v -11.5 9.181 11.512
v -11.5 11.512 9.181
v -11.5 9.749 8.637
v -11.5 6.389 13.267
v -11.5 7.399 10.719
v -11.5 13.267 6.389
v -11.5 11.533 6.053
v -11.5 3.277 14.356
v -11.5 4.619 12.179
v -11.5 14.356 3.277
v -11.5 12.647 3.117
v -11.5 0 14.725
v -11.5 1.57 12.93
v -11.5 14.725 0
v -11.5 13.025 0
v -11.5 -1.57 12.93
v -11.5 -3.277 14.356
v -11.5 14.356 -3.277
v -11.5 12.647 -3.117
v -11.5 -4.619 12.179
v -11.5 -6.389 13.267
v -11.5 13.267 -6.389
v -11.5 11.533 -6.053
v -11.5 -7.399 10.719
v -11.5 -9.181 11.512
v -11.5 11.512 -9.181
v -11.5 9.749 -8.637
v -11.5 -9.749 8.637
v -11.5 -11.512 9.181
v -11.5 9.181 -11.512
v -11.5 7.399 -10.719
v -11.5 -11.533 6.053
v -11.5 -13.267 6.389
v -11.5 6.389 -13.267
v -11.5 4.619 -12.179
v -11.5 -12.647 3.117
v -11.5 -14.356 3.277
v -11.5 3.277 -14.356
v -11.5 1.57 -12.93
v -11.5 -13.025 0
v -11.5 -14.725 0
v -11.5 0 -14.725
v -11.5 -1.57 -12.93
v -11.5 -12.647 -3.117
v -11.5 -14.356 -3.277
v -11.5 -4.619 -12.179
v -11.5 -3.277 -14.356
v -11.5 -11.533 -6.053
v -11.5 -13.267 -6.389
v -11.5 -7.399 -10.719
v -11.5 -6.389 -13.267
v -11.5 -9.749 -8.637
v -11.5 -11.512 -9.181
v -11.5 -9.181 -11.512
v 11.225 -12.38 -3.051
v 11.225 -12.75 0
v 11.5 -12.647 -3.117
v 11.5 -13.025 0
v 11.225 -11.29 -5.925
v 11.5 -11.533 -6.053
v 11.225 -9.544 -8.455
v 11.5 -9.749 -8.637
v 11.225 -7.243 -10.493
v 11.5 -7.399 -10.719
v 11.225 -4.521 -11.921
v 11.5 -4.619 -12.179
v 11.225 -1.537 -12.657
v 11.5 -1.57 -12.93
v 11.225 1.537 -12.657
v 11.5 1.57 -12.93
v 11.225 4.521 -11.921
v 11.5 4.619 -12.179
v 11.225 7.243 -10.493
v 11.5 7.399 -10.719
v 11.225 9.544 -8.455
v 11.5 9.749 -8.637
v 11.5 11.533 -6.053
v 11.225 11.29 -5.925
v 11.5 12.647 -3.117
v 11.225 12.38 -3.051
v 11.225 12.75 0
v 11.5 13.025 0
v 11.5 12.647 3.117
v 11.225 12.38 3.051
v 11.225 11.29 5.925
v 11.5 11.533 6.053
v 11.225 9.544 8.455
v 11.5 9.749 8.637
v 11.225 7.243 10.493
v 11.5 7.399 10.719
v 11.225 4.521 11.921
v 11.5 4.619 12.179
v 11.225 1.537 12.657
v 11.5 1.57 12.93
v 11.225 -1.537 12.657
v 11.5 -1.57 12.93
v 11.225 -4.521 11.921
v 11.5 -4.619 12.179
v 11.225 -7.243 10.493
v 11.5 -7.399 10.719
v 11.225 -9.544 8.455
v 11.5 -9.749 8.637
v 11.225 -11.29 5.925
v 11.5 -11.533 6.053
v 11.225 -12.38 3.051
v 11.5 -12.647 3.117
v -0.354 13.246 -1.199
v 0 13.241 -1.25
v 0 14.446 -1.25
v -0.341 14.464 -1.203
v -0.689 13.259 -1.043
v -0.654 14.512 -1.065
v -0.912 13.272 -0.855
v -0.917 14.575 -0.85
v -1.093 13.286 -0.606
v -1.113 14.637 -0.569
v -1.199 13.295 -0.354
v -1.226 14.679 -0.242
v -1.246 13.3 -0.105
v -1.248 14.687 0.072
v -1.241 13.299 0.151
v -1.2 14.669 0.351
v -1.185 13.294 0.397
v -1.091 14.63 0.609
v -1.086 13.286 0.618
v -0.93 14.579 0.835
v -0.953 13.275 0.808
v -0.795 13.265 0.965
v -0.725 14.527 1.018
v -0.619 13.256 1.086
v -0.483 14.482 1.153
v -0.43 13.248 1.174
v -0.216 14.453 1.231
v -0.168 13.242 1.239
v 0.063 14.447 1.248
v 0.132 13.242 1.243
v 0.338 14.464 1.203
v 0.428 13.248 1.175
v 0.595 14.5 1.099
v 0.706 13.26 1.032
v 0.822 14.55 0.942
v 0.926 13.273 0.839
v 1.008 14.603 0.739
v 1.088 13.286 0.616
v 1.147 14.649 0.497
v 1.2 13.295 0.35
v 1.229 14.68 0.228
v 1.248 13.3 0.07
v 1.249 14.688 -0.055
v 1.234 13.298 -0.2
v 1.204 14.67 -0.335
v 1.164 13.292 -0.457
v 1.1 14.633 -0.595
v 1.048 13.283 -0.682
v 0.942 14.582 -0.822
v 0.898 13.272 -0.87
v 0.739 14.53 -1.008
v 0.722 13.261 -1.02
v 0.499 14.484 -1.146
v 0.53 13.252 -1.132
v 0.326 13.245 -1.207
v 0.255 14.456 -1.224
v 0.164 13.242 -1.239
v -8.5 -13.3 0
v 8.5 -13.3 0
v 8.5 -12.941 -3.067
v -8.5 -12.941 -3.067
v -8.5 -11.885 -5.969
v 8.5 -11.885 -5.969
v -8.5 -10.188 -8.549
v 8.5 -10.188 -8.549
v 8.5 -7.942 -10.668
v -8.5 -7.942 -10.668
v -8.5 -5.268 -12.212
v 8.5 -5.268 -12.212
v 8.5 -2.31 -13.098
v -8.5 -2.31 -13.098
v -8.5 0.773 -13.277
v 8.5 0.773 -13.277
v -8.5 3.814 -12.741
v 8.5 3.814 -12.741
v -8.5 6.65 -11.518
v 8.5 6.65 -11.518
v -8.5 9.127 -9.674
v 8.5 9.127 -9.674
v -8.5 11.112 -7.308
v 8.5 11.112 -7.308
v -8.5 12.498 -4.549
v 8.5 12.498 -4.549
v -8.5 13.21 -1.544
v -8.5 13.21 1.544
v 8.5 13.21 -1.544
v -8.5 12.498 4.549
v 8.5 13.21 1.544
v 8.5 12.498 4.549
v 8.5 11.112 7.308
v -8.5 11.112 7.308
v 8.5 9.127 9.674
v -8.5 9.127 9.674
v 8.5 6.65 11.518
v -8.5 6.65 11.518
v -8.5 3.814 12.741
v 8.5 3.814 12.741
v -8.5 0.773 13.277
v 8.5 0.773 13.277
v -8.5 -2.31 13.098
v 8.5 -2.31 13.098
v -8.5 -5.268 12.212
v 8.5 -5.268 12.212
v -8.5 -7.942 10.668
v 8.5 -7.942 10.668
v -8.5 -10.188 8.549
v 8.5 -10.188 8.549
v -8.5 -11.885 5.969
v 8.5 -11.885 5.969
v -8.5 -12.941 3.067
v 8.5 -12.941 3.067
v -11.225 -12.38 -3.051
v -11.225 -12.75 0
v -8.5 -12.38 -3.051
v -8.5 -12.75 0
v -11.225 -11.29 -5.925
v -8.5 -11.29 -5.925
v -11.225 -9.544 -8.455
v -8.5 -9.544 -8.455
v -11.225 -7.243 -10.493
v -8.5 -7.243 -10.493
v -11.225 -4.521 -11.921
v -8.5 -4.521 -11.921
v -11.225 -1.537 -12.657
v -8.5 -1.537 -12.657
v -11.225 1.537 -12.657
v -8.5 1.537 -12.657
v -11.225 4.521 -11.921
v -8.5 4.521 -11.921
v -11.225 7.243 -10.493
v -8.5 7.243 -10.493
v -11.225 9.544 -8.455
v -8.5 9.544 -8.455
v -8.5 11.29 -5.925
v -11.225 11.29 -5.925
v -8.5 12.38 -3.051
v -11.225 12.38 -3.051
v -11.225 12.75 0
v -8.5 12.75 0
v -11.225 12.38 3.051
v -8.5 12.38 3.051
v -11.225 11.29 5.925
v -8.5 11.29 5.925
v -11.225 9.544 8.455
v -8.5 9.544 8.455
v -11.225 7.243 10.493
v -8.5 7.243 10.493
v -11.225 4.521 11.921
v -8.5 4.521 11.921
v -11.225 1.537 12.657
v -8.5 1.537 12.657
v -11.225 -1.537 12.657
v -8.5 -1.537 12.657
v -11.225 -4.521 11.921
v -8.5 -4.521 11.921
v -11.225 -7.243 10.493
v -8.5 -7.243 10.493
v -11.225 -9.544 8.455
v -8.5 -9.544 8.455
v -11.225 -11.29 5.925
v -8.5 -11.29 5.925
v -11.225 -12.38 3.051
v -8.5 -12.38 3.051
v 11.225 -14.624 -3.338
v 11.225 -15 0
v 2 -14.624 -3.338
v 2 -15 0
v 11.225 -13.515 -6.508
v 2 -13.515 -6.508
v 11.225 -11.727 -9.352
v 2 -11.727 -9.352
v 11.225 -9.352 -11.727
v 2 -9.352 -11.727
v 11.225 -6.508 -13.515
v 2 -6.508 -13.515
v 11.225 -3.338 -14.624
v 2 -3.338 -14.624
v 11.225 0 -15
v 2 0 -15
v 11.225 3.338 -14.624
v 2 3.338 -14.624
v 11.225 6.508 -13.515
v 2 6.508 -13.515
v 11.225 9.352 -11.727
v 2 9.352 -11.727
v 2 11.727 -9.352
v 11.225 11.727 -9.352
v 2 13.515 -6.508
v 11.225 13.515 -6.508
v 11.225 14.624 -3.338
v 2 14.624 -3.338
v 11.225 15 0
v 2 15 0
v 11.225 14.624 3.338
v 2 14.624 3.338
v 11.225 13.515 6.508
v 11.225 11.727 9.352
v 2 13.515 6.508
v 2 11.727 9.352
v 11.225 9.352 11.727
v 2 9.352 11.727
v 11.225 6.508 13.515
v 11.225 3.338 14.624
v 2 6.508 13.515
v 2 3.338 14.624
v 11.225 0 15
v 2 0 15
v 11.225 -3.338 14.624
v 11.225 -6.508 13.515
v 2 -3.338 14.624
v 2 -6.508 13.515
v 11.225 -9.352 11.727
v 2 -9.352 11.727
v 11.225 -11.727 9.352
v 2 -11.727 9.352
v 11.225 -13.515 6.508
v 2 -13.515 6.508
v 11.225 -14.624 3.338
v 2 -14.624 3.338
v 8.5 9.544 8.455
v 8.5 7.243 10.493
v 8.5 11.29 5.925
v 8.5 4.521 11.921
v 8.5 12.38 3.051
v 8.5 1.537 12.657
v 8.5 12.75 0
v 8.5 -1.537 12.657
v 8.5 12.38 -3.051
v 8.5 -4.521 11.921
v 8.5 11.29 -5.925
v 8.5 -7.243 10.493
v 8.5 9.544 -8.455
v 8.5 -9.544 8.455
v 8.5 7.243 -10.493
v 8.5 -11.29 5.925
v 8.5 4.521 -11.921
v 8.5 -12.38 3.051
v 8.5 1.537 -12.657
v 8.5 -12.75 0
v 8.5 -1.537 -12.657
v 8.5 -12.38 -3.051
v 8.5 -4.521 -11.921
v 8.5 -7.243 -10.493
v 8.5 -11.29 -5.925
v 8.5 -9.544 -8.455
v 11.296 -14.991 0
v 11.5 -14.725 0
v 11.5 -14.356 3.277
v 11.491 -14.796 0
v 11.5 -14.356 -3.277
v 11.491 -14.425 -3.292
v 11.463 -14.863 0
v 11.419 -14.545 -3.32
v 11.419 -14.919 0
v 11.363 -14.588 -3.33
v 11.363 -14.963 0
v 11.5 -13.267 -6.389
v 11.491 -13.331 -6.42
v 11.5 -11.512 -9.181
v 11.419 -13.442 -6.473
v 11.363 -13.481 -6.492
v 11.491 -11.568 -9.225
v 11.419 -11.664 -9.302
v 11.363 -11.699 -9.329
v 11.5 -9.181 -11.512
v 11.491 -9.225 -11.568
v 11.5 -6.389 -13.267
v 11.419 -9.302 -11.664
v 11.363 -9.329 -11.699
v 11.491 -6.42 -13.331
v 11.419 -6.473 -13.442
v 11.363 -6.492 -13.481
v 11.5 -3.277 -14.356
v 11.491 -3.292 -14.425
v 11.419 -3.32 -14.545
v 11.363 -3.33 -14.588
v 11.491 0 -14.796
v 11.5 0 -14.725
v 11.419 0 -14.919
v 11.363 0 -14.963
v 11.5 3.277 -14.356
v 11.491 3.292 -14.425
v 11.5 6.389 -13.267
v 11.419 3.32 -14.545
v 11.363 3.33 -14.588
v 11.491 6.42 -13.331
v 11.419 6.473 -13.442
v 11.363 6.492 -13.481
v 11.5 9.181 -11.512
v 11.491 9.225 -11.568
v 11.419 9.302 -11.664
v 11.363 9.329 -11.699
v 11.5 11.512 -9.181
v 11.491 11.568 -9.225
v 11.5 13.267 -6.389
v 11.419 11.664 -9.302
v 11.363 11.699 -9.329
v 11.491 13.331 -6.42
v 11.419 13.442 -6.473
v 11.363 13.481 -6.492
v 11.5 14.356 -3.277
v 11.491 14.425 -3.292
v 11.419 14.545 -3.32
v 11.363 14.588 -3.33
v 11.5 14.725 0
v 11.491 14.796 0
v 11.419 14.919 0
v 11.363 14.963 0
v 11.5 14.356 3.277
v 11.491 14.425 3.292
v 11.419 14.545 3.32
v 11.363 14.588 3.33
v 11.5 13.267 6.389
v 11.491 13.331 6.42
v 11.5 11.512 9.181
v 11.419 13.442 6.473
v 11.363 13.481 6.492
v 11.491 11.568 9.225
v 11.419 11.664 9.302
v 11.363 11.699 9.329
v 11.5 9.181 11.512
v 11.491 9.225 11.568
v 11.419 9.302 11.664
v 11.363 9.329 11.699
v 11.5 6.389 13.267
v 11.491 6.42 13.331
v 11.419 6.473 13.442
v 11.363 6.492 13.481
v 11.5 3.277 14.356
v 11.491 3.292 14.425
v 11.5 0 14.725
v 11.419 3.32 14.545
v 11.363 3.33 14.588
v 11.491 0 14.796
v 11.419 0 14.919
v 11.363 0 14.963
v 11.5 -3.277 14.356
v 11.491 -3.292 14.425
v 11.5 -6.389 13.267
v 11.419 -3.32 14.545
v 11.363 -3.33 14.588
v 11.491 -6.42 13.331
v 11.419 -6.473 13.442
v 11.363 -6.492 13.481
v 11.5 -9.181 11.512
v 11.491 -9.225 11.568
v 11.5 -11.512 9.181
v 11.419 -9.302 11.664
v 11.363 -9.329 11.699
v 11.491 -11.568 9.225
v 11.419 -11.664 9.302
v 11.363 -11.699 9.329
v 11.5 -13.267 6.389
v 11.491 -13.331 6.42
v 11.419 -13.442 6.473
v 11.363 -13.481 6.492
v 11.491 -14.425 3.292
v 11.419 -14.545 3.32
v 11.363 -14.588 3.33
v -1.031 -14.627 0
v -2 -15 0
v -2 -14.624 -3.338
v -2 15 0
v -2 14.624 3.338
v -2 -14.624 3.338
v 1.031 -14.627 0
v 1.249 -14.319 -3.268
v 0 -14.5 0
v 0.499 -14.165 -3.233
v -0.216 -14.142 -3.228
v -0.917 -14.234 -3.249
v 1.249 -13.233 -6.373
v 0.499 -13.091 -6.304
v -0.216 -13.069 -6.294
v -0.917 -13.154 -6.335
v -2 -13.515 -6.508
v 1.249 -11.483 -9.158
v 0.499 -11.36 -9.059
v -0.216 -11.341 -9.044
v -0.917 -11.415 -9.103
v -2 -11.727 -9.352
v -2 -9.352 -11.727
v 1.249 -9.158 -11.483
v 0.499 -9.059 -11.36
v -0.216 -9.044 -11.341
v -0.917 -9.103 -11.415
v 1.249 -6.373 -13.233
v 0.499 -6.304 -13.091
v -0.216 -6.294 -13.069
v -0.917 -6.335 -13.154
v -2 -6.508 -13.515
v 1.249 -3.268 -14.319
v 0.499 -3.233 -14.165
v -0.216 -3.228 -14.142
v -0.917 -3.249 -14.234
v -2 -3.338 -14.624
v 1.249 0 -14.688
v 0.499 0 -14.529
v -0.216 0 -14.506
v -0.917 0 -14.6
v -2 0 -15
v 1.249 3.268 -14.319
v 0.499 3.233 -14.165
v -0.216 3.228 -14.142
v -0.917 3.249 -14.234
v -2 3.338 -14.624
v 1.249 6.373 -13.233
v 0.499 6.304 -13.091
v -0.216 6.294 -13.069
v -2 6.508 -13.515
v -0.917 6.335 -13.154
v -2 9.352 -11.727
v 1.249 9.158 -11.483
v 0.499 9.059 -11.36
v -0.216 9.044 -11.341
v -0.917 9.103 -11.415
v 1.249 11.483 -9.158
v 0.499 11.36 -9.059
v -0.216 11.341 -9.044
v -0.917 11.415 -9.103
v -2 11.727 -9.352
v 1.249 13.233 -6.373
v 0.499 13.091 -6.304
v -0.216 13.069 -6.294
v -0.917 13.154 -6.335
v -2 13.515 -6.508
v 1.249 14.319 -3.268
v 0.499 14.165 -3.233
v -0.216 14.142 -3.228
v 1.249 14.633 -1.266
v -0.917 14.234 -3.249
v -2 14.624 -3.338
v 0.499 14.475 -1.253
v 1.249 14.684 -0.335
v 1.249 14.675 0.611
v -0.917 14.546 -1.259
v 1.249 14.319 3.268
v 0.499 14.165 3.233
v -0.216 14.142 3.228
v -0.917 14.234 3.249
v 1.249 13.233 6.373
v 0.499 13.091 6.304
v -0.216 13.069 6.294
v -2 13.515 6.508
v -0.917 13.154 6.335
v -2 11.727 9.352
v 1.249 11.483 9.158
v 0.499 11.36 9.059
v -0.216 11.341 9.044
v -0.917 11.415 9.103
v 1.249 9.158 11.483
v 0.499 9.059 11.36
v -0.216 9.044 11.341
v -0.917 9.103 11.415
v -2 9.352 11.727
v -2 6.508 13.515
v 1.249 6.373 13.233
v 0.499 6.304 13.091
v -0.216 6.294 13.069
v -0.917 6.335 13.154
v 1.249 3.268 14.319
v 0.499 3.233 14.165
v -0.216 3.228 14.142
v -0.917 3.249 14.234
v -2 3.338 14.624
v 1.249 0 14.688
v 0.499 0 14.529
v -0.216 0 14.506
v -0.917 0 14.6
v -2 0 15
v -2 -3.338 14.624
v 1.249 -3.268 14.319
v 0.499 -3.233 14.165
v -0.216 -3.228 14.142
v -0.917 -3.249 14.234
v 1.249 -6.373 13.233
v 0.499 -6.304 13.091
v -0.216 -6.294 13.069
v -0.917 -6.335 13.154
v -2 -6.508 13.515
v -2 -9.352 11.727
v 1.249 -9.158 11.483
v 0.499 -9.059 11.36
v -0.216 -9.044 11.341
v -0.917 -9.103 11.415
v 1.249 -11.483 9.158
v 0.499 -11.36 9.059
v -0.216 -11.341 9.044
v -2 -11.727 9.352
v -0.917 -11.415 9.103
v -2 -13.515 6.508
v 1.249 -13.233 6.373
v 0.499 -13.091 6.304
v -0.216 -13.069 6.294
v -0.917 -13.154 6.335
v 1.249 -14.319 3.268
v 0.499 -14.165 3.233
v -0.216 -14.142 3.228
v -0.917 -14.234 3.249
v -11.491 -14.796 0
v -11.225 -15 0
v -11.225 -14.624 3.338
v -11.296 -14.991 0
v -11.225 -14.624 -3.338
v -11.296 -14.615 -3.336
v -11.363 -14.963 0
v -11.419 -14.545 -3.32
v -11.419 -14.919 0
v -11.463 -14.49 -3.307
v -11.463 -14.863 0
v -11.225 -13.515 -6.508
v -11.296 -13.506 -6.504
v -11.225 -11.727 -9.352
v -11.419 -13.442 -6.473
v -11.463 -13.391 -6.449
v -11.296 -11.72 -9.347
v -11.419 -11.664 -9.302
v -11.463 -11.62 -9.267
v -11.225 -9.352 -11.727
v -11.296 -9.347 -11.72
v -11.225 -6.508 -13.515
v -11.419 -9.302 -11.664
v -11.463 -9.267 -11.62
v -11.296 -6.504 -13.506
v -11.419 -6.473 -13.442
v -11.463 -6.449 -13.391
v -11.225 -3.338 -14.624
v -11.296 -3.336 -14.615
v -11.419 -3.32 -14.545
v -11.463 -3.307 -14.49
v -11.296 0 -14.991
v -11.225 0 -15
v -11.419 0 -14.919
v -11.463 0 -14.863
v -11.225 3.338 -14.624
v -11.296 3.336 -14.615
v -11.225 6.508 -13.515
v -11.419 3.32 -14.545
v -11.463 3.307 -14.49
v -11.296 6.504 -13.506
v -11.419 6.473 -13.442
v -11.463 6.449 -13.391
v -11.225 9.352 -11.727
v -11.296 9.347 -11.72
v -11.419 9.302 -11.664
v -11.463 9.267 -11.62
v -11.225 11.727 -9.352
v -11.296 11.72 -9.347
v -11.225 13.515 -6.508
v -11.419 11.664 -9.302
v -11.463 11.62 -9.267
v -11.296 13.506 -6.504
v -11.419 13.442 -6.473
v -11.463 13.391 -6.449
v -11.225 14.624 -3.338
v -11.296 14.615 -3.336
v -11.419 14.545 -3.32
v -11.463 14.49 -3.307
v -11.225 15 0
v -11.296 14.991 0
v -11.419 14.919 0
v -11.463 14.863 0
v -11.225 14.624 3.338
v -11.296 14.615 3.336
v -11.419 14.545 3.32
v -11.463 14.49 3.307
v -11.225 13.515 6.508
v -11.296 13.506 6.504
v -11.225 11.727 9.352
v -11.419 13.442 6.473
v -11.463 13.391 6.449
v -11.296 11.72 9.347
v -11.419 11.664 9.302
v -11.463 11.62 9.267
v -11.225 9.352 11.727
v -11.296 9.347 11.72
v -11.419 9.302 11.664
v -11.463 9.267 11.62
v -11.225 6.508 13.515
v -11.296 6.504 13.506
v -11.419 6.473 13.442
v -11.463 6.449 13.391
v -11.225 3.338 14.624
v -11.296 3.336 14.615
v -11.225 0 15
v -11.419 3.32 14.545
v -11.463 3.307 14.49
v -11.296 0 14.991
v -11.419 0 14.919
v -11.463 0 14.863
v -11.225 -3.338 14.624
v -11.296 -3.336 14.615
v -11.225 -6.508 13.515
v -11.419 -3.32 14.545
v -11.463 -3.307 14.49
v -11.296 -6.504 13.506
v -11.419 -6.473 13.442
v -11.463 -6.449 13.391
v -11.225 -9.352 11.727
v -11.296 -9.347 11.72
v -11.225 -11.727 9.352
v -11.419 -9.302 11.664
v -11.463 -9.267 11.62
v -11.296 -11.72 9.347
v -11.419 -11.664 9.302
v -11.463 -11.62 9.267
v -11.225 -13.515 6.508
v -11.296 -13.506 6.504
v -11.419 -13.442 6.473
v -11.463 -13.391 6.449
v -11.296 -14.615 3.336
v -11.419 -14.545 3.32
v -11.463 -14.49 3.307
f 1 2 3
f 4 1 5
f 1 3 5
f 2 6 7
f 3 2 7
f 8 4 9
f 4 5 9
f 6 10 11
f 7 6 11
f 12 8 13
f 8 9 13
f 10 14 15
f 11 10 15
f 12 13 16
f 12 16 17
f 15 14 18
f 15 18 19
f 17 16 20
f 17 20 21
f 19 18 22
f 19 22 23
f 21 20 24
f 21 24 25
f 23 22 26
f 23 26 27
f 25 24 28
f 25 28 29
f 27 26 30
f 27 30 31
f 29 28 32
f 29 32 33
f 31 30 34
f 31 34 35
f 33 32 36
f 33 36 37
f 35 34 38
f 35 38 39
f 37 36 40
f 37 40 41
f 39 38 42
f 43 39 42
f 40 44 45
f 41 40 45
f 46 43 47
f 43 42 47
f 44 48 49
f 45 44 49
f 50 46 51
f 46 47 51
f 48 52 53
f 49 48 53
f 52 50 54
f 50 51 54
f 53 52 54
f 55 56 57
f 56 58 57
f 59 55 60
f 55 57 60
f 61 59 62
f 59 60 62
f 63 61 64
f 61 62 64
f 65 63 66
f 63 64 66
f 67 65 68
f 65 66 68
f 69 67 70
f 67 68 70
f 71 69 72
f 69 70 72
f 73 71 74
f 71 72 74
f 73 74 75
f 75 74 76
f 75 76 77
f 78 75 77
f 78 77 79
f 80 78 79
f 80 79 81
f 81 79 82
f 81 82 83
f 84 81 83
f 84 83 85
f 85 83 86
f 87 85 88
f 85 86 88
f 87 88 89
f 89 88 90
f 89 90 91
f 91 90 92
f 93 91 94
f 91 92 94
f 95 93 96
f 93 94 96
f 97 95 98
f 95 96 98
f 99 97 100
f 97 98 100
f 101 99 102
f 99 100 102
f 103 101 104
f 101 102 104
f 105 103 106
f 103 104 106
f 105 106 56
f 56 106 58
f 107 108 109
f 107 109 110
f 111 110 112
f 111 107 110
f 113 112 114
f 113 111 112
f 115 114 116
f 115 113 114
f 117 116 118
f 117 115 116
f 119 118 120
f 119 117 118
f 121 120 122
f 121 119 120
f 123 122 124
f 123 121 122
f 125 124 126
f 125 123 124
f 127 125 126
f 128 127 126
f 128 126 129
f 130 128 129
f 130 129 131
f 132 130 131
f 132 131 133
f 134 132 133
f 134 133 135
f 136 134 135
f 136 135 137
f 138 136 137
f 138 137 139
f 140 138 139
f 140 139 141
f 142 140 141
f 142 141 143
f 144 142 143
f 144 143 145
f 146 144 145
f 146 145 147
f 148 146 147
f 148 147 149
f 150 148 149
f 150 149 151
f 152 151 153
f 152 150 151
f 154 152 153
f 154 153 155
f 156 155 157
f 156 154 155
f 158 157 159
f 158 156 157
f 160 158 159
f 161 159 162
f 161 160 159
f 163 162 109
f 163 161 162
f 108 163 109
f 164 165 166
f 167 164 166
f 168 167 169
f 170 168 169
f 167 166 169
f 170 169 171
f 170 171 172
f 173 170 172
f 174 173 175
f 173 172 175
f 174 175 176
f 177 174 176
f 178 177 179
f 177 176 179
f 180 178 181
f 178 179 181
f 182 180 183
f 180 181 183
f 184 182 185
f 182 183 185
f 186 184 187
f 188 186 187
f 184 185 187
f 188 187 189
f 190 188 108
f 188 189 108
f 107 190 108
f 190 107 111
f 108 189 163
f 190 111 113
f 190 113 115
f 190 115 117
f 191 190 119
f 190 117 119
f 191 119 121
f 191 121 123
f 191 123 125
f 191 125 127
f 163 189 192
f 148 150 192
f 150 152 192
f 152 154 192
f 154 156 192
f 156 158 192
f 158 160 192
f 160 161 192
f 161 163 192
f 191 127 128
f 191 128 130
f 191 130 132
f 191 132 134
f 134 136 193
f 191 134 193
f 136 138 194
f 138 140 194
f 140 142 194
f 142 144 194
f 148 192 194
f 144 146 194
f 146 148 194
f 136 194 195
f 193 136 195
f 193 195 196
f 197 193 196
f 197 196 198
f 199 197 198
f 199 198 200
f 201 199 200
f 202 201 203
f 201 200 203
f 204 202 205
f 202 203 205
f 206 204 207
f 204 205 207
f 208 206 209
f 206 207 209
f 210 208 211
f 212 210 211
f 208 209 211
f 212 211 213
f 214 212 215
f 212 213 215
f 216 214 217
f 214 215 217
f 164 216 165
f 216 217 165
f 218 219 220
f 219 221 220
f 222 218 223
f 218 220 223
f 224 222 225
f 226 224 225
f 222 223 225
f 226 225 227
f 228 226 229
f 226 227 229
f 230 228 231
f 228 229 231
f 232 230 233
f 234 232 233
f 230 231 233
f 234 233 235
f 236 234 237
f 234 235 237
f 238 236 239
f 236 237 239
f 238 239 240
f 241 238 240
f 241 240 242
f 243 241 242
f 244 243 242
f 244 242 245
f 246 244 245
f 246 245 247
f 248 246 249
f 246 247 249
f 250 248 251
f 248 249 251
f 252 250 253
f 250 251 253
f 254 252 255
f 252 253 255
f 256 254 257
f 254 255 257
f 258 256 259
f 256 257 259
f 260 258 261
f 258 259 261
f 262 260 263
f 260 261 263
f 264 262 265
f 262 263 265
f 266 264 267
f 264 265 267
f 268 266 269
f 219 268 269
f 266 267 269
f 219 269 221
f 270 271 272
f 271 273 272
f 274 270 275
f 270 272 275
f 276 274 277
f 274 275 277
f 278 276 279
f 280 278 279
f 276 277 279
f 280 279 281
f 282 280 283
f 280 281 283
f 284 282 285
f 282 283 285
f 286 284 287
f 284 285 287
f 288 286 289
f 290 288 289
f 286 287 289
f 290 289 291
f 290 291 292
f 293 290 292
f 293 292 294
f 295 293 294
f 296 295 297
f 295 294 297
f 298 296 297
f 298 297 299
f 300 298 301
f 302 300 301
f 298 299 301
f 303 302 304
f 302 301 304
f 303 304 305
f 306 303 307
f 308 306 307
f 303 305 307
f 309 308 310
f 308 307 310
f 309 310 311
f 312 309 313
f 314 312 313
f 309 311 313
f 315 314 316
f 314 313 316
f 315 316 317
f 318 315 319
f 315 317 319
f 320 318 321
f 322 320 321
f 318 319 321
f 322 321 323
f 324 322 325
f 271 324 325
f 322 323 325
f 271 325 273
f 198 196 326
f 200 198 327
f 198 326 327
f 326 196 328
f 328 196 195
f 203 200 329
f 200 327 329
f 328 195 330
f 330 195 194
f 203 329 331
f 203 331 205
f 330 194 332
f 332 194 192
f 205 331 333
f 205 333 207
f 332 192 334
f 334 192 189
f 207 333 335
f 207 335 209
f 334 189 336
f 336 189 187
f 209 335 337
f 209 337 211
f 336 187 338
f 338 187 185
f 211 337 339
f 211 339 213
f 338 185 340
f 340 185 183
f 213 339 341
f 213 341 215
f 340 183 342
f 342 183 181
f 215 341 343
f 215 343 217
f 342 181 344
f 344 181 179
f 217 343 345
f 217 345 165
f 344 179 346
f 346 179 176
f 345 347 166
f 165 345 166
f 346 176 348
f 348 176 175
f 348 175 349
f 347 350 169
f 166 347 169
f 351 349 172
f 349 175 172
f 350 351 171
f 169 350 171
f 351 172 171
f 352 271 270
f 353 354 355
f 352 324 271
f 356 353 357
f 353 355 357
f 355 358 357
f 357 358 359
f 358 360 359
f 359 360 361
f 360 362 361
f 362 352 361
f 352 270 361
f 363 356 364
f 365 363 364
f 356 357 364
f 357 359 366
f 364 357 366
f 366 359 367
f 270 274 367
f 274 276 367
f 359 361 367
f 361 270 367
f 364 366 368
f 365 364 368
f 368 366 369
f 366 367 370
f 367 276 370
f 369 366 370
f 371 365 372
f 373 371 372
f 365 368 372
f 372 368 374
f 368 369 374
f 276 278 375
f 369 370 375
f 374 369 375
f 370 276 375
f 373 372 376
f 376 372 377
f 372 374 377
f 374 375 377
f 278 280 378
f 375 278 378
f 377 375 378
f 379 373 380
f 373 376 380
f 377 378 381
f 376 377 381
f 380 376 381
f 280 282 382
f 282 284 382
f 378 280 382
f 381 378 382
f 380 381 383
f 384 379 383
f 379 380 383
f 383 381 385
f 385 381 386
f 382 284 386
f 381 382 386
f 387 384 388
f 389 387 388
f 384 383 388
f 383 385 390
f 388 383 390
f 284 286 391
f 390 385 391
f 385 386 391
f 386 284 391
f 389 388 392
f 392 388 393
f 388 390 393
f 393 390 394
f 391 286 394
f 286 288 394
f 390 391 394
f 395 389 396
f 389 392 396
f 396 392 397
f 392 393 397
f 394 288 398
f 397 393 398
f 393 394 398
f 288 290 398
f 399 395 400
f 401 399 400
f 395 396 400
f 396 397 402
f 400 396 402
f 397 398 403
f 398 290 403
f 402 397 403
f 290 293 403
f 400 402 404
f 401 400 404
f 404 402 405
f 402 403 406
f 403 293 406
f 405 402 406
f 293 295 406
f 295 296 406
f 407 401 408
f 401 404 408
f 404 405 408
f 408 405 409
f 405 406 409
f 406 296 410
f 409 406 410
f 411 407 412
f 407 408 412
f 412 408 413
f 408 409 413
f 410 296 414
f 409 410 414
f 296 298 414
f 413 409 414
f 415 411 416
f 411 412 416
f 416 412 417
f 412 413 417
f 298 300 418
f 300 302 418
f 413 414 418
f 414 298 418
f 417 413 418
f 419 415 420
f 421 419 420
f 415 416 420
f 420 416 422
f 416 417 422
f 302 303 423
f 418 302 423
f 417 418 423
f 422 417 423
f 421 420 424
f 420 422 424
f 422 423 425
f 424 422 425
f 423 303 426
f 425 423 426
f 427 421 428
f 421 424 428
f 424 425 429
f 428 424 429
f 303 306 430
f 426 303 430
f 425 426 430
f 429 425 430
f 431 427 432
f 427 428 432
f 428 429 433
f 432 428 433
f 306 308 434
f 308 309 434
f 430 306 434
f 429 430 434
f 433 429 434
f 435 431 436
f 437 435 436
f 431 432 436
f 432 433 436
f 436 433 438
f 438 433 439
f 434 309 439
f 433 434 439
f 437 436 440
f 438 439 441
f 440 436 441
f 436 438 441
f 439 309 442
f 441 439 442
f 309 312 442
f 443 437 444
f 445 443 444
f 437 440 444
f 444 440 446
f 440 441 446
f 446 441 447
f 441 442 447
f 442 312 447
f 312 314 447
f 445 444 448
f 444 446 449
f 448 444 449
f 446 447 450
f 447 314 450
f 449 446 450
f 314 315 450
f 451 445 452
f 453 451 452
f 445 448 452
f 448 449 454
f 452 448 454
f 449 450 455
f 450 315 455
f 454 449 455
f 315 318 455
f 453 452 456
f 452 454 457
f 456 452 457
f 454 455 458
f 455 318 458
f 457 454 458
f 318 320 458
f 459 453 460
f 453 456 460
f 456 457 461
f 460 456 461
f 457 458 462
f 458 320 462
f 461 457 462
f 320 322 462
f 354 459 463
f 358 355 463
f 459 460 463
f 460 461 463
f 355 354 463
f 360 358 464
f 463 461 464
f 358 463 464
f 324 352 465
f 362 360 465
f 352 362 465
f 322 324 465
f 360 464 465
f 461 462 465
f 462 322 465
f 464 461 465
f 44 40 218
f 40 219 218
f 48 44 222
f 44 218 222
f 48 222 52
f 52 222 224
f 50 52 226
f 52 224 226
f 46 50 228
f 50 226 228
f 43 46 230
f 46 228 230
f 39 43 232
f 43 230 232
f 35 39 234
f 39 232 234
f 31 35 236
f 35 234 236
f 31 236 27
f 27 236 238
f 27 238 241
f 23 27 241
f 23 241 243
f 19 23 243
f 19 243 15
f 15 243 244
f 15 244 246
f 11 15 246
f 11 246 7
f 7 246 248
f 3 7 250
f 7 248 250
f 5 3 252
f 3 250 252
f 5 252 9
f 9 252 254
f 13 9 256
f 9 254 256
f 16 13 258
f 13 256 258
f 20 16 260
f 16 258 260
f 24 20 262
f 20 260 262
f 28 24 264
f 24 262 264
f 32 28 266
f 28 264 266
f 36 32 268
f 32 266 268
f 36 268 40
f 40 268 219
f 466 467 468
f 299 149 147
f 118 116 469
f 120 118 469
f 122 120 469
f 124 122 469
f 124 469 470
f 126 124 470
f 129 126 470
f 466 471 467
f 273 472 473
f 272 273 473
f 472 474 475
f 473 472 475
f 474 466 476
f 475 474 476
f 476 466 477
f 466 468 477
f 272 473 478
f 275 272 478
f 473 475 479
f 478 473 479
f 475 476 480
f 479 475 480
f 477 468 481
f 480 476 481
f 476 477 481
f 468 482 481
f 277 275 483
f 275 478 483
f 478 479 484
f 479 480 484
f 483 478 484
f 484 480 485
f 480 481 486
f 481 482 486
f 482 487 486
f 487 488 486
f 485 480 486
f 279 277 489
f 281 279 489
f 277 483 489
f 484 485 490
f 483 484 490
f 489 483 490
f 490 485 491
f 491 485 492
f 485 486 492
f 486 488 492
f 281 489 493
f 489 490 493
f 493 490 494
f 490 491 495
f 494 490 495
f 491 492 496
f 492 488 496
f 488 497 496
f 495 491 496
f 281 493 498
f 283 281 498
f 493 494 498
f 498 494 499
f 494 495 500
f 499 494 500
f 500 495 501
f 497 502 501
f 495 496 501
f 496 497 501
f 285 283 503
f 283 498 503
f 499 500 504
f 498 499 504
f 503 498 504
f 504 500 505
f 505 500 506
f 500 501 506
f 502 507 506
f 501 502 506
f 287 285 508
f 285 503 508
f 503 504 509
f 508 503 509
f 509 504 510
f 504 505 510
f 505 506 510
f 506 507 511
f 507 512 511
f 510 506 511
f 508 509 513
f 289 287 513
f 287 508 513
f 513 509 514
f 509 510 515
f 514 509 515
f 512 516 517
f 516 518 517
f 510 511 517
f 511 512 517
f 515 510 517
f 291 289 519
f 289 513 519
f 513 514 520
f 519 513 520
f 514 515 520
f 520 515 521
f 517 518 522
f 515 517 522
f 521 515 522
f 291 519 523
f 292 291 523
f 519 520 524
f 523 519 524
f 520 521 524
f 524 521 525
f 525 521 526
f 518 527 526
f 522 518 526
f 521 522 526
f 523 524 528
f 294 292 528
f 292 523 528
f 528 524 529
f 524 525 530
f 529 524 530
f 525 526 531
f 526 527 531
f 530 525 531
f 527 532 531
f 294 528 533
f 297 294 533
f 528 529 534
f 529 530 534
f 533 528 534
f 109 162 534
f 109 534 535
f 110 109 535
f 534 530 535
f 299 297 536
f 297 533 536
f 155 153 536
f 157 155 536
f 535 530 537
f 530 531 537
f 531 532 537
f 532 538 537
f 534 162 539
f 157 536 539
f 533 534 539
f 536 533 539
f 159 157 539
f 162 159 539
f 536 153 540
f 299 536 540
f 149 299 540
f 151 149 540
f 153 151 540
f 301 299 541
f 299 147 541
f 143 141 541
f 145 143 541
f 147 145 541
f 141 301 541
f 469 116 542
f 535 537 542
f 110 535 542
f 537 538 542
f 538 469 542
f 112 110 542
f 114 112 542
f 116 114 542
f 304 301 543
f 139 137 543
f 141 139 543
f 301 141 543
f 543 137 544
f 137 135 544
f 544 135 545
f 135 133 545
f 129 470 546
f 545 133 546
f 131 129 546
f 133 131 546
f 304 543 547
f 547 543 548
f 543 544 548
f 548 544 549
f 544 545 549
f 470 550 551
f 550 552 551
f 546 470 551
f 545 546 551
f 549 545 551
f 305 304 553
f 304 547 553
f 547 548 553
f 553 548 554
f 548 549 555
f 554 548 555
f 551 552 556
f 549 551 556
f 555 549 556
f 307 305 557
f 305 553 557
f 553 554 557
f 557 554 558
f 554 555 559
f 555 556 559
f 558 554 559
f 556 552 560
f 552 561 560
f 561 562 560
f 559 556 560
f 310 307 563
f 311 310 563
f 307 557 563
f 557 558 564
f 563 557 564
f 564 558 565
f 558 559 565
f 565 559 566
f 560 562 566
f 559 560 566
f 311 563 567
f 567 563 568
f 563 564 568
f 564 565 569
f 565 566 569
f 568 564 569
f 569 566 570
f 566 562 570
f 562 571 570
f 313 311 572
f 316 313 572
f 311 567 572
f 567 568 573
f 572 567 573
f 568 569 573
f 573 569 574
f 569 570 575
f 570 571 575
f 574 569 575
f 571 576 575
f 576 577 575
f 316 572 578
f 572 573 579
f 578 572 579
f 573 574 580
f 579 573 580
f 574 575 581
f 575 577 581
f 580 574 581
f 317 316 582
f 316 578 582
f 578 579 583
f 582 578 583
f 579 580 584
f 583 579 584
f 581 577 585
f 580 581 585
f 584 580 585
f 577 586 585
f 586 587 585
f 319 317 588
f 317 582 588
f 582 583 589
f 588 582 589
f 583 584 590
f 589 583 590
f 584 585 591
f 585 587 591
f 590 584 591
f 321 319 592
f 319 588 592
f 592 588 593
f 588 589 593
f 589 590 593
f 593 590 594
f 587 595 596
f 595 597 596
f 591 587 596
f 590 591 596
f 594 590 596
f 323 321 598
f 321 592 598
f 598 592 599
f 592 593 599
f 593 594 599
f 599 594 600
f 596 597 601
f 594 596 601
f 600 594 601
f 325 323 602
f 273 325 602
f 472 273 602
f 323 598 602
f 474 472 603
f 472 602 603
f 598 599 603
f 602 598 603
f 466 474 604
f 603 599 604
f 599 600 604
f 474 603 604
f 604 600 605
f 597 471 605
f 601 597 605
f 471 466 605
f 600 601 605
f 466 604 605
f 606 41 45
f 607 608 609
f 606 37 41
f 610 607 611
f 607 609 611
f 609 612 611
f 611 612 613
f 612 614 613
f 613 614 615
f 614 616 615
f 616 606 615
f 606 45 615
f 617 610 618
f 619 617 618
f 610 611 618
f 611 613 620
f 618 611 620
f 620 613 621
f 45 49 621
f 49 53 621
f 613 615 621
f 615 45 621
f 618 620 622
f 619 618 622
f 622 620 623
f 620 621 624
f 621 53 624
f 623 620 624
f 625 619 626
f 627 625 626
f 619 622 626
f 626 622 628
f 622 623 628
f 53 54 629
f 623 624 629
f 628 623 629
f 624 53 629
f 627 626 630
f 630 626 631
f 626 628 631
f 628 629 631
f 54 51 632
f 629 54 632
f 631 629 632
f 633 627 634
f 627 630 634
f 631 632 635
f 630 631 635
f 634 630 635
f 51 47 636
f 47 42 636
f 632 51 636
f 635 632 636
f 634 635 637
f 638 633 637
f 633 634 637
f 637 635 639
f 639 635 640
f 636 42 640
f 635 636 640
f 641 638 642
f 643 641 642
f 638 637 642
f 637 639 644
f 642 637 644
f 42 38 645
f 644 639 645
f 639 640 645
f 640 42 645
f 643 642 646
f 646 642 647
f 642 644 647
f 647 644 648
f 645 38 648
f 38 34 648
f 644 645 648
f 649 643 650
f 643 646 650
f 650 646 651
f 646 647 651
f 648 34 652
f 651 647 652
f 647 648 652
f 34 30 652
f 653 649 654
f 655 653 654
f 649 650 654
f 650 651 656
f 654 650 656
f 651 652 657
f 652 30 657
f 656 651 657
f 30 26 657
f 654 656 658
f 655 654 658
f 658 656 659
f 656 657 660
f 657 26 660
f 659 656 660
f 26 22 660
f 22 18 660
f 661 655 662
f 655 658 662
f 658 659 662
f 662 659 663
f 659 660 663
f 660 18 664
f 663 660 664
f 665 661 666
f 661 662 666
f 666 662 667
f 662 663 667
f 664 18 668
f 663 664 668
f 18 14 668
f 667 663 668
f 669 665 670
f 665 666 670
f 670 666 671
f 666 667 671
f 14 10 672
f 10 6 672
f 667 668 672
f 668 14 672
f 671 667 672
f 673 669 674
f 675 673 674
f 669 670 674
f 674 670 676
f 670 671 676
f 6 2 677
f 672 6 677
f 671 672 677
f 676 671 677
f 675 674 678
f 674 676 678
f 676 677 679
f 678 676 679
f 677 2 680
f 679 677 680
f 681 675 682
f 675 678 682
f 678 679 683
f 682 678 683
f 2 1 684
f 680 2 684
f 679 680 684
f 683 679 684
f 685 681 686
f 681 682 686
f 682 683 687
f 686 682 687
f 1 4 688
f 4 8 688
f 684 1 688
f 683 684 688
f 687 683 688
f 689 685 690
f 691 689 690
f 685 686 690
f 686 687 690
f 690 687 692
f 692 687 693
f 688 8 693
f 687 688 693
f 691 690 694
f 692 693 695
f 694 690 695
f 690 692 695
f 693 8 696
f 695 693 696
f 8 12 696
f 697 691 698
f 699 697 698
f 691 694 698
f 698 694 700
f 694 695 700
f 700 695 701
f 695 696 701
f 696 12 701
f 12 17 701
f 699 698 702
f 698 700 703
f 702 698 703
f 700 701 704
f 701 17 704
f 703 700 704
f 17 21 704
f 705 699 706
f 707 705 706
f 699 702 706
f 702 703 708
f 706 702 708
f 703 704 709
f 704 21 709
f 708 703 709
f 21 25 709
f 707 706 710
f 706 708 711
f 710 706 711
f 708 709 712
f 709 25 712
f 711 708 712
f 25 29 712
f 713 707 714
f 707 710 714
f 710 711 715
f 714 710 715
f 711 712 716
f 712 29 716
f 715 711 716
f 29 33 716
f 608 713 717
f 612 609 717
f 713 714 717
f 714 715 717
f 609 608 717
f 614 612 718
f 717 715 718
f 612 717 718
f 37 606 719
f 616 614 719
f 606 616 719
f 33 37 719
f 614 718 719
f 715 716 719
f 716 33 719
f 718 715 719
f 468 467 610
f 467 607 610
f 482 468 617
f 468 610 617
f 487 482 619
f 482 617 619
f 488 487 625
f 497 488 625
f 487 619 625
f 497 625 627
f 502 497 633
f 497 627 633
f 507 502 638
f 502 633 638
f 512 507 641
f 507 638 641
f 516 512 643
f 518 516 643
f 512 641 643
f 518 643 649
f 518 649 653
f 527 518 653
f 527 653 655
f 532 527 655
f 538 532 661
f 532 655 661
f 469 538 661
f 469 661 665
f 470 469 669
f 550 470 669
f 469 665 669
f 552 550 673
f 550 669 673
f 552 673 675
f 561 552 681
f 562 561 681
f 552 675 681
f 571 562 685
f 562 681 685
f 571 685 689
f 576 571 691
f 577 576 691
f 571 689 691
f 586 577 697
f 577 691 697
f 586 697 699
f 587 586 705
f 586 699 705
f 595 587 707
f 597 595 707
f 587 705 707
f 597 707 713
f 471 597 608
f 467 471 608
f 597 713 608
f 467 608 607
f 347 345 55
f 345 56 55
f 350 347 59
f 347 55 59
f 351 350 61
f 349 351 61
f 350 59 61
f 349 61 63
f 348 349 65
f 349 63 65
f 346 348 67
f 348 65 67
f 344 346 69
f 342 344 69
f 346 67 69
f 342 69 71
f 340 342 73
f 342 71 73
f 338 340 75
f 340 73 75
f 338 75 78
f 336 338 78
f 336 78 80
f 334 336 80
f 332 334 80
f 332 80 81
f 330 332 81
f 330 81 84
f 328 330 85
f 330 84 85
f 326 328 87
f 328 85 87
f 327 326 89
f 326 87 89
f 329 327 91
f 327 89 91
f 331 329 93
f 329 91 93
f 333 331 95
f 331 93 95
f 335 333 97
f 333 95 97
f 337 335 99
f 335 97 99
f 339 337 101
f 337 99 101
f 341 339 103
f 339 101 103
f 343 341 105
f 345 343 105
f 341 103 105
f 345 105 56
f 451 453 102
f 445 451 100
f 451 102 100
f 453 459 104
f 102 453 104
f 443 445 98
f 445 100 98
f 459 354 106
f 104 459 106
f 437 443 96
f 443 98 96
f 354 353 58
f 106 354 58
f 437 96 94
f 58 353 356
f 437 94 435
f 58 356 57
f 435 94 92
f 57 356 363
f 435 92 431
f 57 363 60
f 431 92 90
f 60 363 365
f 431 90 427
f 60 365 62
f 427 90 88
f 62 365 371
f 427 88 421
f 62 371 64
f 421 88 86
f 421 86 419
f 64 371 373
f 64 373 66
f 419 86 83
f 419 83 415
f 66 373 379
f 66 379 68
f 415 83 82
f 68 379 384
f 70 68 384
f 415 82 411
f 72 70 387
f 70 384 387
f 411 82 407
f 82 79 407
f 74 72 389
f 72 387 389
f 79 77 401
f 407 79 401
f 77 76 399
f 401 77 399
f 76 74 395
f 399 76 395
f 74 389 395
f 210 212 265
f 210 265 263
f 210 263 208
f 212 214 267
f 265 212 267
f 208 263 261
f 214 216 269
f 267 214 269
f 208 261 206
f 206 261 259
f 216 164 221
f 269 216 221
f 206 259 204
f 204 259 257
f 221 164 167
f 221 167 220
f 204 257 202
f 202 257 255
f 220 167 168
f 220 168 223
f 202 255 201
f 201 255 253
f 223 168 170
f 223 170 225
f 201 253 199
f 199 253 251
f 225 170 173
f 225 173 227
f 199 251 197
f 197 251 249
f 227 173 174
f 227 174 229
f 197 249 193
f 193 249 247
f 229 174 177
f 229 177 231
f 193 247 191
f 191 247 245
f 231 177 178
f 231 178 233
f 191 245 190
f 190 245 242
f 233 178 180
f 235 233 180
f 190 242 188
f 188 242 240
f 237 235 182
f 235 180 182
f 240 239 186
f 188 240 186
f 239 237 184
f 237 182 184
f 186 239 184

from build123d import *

# Parameters (mm, degrees)
SKETCH4_R          = 1.25
CUT_EXTRUDE1_DEPTH = 25.129857072


with BuildPart() as part:
    # Sketch2 → Revolve1 (revolve)
    with BuildSketch(Plane.XY, mode=Mode.PRIVATE) as revolve1_sk:
        with BuildLine():
            Line((-8.5, 13.3), (8.5, 13.3))
            Line((8.5, 13.3), (8.5, 12.75))
            Line((8.5, 12.75), (11.225, 12.75))
            Line((11.225, 12.75), (11.5, 13.025))
            Line((11.5, 13.025), (11.5, 14.725))
            ThreePointArc((11.5, 14.725), (11.419454365, 14.919454365), (11.225, 15))
            Line((11.225, 15), (2, 15))
            ThreePointArc((2, 15), (0, 14.5), (-2, 15))
            Line((-2, 15), (-11.225, 15))
            ThreePointArc((-11.225, 15), (-11.419454365, 14.919454365), (-11.5, 14.725))
            Line((-11.5, 14.725), (-11.5, 13.025))
            Line((-11.5, 13.025), (-11.225, 12.75))
            Line((-11.225, 12.75), (-8.5, 12.75))
            Line((-8.5, 12.75), (-8.5, 13.3))
        make_face()
    revolve(revolve1_sk.sketch.rotate(Axis((-11.5, 0, 0), (1, 0, 0)), 180), axis=Axis((-11.5, 0, 0), (1, 0, 0)))

    # Sketch4 → Cut-Extrude1 (cut, through all)
    with BuildSketch(Plane(origin=(0, 0, 0), x_dir=(1, 0, 0), z_dir=(0, 1, 0))):
        with Locations(Location((0, 0, 0), (0, 0, 90))):
            Circle(SKETCH4_R)
    extrude(amount=CUT_EXTRUDE1_DEPTH, mode=Mode.SUBTRACT)


solid = part.part
